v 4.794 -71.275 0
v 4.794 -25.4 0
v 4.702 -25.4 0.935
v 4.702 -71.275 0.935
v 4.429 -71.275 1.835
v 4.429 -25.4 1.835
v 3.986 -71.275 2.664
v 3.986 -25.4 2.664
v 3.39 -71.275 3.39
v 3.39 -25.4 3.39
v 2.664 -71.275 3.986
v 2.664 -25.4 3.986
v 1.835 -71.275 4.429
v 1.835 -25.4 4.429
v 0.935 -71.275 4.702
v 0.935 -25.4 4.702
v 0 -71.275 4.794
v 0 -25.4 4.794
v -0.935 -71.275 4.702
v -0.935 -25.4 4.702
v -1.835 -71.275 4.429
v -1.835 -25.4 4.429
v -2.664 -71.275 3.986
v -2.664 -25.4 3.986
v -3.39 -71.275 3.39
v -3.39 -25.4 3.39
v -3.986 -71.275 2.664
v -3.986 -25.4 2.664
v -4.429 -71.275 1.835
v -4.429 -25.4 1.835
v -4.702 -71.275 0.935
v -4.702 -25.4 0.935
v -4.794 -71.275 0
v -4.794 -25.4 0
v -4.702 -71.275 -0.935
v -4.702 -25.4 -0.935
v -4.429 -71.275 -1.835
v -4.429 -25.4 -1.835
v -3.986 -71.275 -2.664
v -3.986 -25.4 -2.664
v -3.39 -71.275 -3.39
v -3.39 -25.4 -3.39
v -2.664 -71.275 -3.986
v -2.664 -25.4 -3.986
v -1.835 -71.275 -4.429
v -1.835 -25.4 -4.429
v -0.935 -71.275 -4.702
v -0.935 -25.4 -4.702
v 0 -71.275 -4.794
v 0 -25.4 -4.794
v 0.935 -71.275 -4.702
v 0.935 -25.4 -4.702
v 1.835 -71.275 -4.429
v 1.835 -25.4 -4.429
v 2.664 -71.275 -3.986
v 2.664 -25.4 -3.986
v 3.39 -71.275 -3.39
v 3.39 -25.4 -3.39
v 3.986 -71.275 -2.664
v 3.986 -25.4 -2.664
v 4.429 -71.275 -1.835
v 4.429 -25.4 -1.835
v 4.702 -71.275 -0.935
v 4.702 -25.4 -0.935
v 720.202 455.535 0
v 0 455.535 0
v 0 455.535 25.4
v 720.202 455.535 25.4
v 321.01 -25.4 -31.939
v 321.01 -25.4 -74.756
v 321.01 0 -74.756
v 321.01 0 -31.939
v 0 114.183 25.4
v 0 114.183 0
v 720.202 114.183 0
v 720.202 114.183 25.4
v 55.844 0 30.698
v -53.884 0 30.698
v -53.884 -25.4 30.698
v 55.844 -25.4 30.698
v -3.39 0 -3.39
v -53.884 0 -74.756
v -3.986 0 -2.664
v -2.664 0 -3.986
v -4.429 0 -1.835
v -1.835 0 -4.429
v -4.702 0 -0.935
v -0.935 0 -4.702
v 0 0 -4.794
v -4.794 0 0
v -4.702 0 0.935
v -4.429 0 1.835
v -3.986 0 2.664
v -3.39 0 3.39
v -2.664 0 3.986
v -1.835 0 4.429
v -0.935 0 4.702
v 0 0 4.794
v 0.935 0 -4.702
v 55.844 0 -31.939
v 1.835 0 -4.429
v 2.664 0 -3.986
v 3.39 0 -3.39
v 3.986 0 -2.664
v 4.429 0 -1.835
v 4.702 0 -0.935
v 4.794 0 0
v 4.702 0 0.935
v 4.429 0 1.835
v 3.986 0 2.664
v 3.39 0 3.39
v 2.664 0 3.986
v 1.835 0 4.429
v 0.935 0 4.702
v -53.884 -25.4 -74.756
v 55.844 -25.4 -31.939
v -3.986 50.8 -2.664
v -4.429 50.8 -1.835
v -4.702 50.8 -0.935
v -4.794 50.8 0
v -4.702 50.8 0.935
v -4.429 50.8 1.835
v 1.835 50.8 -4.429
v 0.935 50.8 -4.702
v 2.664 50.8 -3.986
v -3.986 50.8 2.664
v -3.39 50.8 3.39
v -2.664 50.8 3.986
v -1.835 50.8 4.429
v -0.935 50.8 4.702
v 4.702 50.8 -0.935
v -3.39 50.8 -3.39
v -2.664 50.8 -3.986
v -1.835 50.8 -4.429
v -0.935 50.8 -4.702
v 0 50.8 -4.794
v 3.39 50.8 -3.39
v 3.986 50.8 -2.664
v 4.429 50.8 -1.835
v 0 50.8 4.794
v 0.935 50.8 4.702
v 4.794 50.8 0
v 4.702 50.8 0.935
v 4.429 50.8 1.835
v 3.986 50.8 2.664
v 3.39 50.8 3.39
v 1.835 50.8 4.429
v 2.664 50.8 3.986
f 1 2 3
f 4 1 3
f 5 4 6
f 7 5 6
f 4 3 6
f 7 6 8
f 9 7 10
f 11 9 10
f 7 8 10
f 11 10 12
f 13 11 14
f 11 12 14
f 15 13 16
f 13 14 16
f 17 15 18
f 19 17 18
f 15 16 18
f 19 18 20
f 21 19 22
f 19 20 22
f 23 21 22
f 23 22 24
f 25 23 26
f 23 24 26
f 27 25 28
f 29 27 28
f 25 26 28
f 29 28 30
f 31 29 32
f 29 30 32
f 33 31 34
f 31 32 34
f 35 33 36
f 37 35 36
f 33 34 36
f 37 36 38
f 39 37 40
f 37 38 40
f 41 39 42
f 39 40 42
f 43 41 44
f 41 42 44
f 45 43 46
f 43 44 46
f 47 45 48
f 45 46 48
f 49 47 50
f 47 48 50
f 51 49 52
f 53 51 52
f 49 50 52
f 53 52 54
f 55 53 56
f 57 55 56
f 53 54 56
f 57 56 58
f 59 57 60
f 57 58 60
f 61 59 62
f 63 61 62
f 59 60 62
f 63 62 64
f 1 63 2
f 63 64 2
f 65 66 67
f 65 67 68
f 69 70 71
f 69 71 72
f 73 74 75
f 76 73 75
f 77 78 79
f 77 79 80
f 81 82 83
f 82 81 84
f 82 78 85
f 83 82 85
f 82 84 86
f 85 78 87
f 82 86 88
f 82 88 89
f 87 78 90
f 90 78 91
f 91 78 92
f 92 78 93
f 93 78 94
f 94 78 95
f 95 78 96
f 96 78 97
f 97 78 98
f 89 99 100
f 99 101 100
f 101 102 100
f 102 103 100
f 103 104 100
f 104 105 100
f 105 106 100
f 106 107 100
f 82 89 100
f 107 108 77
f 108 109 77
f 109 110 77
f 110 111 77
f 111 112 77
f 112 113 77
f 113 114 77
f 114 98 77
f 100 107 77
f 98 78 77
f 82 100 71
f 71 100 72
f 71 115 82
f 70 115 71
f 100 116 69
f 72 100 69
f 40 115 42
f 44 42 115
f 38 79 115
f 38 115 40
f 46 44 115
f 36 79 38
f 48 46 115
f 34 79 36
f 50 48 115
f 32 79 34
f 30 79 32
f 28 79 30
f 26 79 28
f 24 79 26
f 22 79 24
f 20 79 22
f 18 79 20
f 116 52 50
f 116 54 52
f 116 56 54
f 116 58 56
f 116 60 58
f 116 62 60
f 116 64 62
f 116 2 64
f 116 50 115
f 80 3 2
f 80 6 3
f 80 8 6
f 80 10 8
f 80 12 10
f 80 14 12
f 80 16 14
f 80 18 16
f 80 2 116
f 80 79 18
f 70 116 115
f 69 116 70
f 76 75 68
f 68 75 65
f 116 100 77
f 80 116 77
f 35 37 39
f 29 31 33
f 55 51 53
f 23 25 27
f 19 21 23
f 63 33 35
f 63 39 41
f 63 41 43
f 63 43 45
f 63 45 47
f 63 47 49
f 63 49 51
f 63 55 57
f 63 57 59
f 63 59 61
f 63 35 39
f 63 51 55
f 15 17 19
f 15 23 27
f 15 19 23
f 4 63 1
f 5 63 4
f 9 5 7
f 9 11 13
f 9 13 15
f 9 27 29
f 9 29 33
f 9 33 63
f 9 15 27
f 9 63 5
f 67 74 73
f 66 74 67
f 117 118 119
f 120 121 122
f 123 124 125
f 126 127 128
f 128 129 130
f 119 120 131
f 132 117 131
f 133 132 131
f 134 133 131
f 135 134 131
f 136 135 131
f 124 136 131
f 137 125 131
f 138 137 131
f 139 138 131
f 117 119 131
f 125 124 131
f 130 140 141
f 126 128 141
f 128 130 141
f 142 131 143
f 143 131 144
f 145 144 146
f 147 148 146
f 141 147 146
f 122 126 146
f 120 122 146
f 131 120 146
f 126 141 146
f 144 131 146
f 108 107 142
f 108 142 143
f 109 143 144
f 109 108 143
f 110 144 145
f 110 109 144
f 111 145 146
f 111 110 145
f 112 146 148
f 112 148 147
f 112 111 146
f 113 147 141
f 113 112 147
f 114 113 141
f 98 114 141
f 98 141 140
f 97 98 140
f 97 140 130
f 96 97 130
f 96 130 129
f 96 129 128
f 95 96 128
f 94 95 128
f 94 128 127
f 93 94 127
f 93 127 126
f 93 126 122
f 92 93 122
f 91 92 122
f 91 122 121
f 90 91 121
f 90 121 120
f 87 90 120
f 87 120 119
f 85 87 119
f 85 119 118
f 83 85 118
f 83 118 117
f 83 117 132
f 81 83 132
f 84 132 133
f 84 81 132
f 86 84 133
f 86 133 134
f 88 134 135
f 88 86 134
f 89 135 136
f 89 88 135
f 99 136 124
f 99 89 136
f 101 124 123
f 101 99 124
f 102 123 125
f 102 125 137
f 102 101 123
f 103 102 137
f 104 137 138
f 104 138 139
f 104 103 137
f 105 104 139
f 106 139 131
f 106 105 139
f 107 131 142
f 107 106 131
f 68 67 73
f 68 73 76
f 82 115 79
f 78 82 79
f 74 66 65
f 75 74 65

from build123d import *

# Parameters (mm, degrees)
F0_W          = 109.727997
F0_H          = 76.417719
F1_DEPTH      = 25.4
F2_R          = 4.79425
F3_DEPTH      = 45.87494
F3_DEPTH_BACK = 76.2
F4_W          = 374.894309
F4_H          = 42.816885
F5_DEPTH      = 25.4
F6_W          = 720.201612
F6_H          = 341.352016
F7_DEPTH      = 25.4


with BuildPart() as f1:
    # F0 (on Front) → F1 (new body)
    with BuildSketch(Plane.XZ):
        with Locations((0.979713, -7.511144)):
            Rectangle(F0_W, F0_H)
    extrude(amount=F1_DEPTH)

    # F2 (on face) → F3 (join, two sides)
    with BuildSketch(Plane.XZ.offset(25.4)) as f3_sk:
        Circle(F2_R)
    extrude(amount=F3_DEPTH)
    extrude(f3_sk.sketch, amount=-F3_DEPTH_BACK)

    # F4 (on face) → F5 (join)
    with BuildSketch(Plane.XZ.offset(25.4)):
        with Locations((133.562869, -53.347919)):
            Rectangle(F4_W, F4_H)
    extrude(amount=-F5_DEPTH)


with BuildPart() as f7:
    # F6 (on Top) → F7 (new body)
    with BuildSketch(Plane.XY):
        with Locations((360.100806, 284.859076)):
            Rectangle(F6_W, F6_H)
    extrude(amount=F7_DEPTH)


solid = Compound([f1.part, f7.part])
